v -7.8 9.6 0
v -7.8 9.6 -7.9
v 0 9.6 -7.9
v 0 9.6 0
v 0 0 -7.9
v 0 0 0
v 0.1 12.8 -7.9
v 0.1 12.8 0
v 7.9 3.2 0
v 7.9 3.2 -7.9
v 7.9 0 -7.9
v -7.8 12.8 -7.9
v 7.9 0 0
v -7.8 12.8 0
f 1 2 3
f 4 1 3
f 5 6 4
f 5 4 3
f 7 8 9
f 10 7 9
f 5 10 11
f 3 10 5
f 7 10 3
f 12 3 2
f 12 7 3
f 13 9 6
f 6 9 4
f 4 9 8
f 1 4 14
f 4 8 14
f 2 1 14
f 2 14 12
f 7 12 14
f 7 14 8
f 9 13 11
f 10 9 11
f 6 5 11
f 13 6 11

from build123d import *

# Parameters (mm, degrees)
SKETCH1_W           = 7.9
SKETCH1_H           = 7.9
BOSS_EXTRUDE1_DEPTH = 3.2
SKETCH2_W           = 7.9
SKETCH2_H           = 9.6
BOSS_EXTRUDE2_DEPTH = 0.1
SKETCH3_W           = 7.9
SKETCH3_H           = 7.9
BOSS_EXTRUDE3_DEPTH = 3.2
BOSS_EXTRUDE4_DEPTH = 7.9


with BuildPart() as part:
    # Sketch1 → Boss-Extrude1 (new body)
    with BuildSketch(Plane(origin=(0, 0, 0), x_dir=(1, 0, 0), z_dir=(0, 1, 0))):
        with Locations((3.95, 3.95)):
            Rectangle(SKETCH1_W, SKETCH1_H)
    extrude(amount=BOSS_EXTRUDE1_DEPTH)

    # Sketch2 → Boss-Extrude2 (add)
    with BuildSketch(Plane.ZY):
        with Locations((-3.95, 4.8)):
            Rectangle(SKETCH2_W, SKETCH2_H)
    extrude(amount=-BOSS_EXTRUDE2_DEPTH)

    # Sketch3 → Boss-Extrude3 (add)
    with BuildSketch(Plane(origin=(0, 9.6, 0), x_dir=(1, 0, 0), z_dir=(0, 1, 0))):
        with Locations((-3.85, 3.95)):
            Rectangle(SKETCH3_W, SKETCH3_H)
    extrude(amount=BOSS_EXTRUDE3_DEPTH)

    # Sketch4 → Boss-Extrude4 (add)
    with BuildSketch(Plane.XY):
        Polygon((0.1, 12.8), (7.9, 3.2), (0.1, 3.2), align=None)
    extrude(amount=-BOSS_EXTRUDE4_DEPTH)


solid = part.part
